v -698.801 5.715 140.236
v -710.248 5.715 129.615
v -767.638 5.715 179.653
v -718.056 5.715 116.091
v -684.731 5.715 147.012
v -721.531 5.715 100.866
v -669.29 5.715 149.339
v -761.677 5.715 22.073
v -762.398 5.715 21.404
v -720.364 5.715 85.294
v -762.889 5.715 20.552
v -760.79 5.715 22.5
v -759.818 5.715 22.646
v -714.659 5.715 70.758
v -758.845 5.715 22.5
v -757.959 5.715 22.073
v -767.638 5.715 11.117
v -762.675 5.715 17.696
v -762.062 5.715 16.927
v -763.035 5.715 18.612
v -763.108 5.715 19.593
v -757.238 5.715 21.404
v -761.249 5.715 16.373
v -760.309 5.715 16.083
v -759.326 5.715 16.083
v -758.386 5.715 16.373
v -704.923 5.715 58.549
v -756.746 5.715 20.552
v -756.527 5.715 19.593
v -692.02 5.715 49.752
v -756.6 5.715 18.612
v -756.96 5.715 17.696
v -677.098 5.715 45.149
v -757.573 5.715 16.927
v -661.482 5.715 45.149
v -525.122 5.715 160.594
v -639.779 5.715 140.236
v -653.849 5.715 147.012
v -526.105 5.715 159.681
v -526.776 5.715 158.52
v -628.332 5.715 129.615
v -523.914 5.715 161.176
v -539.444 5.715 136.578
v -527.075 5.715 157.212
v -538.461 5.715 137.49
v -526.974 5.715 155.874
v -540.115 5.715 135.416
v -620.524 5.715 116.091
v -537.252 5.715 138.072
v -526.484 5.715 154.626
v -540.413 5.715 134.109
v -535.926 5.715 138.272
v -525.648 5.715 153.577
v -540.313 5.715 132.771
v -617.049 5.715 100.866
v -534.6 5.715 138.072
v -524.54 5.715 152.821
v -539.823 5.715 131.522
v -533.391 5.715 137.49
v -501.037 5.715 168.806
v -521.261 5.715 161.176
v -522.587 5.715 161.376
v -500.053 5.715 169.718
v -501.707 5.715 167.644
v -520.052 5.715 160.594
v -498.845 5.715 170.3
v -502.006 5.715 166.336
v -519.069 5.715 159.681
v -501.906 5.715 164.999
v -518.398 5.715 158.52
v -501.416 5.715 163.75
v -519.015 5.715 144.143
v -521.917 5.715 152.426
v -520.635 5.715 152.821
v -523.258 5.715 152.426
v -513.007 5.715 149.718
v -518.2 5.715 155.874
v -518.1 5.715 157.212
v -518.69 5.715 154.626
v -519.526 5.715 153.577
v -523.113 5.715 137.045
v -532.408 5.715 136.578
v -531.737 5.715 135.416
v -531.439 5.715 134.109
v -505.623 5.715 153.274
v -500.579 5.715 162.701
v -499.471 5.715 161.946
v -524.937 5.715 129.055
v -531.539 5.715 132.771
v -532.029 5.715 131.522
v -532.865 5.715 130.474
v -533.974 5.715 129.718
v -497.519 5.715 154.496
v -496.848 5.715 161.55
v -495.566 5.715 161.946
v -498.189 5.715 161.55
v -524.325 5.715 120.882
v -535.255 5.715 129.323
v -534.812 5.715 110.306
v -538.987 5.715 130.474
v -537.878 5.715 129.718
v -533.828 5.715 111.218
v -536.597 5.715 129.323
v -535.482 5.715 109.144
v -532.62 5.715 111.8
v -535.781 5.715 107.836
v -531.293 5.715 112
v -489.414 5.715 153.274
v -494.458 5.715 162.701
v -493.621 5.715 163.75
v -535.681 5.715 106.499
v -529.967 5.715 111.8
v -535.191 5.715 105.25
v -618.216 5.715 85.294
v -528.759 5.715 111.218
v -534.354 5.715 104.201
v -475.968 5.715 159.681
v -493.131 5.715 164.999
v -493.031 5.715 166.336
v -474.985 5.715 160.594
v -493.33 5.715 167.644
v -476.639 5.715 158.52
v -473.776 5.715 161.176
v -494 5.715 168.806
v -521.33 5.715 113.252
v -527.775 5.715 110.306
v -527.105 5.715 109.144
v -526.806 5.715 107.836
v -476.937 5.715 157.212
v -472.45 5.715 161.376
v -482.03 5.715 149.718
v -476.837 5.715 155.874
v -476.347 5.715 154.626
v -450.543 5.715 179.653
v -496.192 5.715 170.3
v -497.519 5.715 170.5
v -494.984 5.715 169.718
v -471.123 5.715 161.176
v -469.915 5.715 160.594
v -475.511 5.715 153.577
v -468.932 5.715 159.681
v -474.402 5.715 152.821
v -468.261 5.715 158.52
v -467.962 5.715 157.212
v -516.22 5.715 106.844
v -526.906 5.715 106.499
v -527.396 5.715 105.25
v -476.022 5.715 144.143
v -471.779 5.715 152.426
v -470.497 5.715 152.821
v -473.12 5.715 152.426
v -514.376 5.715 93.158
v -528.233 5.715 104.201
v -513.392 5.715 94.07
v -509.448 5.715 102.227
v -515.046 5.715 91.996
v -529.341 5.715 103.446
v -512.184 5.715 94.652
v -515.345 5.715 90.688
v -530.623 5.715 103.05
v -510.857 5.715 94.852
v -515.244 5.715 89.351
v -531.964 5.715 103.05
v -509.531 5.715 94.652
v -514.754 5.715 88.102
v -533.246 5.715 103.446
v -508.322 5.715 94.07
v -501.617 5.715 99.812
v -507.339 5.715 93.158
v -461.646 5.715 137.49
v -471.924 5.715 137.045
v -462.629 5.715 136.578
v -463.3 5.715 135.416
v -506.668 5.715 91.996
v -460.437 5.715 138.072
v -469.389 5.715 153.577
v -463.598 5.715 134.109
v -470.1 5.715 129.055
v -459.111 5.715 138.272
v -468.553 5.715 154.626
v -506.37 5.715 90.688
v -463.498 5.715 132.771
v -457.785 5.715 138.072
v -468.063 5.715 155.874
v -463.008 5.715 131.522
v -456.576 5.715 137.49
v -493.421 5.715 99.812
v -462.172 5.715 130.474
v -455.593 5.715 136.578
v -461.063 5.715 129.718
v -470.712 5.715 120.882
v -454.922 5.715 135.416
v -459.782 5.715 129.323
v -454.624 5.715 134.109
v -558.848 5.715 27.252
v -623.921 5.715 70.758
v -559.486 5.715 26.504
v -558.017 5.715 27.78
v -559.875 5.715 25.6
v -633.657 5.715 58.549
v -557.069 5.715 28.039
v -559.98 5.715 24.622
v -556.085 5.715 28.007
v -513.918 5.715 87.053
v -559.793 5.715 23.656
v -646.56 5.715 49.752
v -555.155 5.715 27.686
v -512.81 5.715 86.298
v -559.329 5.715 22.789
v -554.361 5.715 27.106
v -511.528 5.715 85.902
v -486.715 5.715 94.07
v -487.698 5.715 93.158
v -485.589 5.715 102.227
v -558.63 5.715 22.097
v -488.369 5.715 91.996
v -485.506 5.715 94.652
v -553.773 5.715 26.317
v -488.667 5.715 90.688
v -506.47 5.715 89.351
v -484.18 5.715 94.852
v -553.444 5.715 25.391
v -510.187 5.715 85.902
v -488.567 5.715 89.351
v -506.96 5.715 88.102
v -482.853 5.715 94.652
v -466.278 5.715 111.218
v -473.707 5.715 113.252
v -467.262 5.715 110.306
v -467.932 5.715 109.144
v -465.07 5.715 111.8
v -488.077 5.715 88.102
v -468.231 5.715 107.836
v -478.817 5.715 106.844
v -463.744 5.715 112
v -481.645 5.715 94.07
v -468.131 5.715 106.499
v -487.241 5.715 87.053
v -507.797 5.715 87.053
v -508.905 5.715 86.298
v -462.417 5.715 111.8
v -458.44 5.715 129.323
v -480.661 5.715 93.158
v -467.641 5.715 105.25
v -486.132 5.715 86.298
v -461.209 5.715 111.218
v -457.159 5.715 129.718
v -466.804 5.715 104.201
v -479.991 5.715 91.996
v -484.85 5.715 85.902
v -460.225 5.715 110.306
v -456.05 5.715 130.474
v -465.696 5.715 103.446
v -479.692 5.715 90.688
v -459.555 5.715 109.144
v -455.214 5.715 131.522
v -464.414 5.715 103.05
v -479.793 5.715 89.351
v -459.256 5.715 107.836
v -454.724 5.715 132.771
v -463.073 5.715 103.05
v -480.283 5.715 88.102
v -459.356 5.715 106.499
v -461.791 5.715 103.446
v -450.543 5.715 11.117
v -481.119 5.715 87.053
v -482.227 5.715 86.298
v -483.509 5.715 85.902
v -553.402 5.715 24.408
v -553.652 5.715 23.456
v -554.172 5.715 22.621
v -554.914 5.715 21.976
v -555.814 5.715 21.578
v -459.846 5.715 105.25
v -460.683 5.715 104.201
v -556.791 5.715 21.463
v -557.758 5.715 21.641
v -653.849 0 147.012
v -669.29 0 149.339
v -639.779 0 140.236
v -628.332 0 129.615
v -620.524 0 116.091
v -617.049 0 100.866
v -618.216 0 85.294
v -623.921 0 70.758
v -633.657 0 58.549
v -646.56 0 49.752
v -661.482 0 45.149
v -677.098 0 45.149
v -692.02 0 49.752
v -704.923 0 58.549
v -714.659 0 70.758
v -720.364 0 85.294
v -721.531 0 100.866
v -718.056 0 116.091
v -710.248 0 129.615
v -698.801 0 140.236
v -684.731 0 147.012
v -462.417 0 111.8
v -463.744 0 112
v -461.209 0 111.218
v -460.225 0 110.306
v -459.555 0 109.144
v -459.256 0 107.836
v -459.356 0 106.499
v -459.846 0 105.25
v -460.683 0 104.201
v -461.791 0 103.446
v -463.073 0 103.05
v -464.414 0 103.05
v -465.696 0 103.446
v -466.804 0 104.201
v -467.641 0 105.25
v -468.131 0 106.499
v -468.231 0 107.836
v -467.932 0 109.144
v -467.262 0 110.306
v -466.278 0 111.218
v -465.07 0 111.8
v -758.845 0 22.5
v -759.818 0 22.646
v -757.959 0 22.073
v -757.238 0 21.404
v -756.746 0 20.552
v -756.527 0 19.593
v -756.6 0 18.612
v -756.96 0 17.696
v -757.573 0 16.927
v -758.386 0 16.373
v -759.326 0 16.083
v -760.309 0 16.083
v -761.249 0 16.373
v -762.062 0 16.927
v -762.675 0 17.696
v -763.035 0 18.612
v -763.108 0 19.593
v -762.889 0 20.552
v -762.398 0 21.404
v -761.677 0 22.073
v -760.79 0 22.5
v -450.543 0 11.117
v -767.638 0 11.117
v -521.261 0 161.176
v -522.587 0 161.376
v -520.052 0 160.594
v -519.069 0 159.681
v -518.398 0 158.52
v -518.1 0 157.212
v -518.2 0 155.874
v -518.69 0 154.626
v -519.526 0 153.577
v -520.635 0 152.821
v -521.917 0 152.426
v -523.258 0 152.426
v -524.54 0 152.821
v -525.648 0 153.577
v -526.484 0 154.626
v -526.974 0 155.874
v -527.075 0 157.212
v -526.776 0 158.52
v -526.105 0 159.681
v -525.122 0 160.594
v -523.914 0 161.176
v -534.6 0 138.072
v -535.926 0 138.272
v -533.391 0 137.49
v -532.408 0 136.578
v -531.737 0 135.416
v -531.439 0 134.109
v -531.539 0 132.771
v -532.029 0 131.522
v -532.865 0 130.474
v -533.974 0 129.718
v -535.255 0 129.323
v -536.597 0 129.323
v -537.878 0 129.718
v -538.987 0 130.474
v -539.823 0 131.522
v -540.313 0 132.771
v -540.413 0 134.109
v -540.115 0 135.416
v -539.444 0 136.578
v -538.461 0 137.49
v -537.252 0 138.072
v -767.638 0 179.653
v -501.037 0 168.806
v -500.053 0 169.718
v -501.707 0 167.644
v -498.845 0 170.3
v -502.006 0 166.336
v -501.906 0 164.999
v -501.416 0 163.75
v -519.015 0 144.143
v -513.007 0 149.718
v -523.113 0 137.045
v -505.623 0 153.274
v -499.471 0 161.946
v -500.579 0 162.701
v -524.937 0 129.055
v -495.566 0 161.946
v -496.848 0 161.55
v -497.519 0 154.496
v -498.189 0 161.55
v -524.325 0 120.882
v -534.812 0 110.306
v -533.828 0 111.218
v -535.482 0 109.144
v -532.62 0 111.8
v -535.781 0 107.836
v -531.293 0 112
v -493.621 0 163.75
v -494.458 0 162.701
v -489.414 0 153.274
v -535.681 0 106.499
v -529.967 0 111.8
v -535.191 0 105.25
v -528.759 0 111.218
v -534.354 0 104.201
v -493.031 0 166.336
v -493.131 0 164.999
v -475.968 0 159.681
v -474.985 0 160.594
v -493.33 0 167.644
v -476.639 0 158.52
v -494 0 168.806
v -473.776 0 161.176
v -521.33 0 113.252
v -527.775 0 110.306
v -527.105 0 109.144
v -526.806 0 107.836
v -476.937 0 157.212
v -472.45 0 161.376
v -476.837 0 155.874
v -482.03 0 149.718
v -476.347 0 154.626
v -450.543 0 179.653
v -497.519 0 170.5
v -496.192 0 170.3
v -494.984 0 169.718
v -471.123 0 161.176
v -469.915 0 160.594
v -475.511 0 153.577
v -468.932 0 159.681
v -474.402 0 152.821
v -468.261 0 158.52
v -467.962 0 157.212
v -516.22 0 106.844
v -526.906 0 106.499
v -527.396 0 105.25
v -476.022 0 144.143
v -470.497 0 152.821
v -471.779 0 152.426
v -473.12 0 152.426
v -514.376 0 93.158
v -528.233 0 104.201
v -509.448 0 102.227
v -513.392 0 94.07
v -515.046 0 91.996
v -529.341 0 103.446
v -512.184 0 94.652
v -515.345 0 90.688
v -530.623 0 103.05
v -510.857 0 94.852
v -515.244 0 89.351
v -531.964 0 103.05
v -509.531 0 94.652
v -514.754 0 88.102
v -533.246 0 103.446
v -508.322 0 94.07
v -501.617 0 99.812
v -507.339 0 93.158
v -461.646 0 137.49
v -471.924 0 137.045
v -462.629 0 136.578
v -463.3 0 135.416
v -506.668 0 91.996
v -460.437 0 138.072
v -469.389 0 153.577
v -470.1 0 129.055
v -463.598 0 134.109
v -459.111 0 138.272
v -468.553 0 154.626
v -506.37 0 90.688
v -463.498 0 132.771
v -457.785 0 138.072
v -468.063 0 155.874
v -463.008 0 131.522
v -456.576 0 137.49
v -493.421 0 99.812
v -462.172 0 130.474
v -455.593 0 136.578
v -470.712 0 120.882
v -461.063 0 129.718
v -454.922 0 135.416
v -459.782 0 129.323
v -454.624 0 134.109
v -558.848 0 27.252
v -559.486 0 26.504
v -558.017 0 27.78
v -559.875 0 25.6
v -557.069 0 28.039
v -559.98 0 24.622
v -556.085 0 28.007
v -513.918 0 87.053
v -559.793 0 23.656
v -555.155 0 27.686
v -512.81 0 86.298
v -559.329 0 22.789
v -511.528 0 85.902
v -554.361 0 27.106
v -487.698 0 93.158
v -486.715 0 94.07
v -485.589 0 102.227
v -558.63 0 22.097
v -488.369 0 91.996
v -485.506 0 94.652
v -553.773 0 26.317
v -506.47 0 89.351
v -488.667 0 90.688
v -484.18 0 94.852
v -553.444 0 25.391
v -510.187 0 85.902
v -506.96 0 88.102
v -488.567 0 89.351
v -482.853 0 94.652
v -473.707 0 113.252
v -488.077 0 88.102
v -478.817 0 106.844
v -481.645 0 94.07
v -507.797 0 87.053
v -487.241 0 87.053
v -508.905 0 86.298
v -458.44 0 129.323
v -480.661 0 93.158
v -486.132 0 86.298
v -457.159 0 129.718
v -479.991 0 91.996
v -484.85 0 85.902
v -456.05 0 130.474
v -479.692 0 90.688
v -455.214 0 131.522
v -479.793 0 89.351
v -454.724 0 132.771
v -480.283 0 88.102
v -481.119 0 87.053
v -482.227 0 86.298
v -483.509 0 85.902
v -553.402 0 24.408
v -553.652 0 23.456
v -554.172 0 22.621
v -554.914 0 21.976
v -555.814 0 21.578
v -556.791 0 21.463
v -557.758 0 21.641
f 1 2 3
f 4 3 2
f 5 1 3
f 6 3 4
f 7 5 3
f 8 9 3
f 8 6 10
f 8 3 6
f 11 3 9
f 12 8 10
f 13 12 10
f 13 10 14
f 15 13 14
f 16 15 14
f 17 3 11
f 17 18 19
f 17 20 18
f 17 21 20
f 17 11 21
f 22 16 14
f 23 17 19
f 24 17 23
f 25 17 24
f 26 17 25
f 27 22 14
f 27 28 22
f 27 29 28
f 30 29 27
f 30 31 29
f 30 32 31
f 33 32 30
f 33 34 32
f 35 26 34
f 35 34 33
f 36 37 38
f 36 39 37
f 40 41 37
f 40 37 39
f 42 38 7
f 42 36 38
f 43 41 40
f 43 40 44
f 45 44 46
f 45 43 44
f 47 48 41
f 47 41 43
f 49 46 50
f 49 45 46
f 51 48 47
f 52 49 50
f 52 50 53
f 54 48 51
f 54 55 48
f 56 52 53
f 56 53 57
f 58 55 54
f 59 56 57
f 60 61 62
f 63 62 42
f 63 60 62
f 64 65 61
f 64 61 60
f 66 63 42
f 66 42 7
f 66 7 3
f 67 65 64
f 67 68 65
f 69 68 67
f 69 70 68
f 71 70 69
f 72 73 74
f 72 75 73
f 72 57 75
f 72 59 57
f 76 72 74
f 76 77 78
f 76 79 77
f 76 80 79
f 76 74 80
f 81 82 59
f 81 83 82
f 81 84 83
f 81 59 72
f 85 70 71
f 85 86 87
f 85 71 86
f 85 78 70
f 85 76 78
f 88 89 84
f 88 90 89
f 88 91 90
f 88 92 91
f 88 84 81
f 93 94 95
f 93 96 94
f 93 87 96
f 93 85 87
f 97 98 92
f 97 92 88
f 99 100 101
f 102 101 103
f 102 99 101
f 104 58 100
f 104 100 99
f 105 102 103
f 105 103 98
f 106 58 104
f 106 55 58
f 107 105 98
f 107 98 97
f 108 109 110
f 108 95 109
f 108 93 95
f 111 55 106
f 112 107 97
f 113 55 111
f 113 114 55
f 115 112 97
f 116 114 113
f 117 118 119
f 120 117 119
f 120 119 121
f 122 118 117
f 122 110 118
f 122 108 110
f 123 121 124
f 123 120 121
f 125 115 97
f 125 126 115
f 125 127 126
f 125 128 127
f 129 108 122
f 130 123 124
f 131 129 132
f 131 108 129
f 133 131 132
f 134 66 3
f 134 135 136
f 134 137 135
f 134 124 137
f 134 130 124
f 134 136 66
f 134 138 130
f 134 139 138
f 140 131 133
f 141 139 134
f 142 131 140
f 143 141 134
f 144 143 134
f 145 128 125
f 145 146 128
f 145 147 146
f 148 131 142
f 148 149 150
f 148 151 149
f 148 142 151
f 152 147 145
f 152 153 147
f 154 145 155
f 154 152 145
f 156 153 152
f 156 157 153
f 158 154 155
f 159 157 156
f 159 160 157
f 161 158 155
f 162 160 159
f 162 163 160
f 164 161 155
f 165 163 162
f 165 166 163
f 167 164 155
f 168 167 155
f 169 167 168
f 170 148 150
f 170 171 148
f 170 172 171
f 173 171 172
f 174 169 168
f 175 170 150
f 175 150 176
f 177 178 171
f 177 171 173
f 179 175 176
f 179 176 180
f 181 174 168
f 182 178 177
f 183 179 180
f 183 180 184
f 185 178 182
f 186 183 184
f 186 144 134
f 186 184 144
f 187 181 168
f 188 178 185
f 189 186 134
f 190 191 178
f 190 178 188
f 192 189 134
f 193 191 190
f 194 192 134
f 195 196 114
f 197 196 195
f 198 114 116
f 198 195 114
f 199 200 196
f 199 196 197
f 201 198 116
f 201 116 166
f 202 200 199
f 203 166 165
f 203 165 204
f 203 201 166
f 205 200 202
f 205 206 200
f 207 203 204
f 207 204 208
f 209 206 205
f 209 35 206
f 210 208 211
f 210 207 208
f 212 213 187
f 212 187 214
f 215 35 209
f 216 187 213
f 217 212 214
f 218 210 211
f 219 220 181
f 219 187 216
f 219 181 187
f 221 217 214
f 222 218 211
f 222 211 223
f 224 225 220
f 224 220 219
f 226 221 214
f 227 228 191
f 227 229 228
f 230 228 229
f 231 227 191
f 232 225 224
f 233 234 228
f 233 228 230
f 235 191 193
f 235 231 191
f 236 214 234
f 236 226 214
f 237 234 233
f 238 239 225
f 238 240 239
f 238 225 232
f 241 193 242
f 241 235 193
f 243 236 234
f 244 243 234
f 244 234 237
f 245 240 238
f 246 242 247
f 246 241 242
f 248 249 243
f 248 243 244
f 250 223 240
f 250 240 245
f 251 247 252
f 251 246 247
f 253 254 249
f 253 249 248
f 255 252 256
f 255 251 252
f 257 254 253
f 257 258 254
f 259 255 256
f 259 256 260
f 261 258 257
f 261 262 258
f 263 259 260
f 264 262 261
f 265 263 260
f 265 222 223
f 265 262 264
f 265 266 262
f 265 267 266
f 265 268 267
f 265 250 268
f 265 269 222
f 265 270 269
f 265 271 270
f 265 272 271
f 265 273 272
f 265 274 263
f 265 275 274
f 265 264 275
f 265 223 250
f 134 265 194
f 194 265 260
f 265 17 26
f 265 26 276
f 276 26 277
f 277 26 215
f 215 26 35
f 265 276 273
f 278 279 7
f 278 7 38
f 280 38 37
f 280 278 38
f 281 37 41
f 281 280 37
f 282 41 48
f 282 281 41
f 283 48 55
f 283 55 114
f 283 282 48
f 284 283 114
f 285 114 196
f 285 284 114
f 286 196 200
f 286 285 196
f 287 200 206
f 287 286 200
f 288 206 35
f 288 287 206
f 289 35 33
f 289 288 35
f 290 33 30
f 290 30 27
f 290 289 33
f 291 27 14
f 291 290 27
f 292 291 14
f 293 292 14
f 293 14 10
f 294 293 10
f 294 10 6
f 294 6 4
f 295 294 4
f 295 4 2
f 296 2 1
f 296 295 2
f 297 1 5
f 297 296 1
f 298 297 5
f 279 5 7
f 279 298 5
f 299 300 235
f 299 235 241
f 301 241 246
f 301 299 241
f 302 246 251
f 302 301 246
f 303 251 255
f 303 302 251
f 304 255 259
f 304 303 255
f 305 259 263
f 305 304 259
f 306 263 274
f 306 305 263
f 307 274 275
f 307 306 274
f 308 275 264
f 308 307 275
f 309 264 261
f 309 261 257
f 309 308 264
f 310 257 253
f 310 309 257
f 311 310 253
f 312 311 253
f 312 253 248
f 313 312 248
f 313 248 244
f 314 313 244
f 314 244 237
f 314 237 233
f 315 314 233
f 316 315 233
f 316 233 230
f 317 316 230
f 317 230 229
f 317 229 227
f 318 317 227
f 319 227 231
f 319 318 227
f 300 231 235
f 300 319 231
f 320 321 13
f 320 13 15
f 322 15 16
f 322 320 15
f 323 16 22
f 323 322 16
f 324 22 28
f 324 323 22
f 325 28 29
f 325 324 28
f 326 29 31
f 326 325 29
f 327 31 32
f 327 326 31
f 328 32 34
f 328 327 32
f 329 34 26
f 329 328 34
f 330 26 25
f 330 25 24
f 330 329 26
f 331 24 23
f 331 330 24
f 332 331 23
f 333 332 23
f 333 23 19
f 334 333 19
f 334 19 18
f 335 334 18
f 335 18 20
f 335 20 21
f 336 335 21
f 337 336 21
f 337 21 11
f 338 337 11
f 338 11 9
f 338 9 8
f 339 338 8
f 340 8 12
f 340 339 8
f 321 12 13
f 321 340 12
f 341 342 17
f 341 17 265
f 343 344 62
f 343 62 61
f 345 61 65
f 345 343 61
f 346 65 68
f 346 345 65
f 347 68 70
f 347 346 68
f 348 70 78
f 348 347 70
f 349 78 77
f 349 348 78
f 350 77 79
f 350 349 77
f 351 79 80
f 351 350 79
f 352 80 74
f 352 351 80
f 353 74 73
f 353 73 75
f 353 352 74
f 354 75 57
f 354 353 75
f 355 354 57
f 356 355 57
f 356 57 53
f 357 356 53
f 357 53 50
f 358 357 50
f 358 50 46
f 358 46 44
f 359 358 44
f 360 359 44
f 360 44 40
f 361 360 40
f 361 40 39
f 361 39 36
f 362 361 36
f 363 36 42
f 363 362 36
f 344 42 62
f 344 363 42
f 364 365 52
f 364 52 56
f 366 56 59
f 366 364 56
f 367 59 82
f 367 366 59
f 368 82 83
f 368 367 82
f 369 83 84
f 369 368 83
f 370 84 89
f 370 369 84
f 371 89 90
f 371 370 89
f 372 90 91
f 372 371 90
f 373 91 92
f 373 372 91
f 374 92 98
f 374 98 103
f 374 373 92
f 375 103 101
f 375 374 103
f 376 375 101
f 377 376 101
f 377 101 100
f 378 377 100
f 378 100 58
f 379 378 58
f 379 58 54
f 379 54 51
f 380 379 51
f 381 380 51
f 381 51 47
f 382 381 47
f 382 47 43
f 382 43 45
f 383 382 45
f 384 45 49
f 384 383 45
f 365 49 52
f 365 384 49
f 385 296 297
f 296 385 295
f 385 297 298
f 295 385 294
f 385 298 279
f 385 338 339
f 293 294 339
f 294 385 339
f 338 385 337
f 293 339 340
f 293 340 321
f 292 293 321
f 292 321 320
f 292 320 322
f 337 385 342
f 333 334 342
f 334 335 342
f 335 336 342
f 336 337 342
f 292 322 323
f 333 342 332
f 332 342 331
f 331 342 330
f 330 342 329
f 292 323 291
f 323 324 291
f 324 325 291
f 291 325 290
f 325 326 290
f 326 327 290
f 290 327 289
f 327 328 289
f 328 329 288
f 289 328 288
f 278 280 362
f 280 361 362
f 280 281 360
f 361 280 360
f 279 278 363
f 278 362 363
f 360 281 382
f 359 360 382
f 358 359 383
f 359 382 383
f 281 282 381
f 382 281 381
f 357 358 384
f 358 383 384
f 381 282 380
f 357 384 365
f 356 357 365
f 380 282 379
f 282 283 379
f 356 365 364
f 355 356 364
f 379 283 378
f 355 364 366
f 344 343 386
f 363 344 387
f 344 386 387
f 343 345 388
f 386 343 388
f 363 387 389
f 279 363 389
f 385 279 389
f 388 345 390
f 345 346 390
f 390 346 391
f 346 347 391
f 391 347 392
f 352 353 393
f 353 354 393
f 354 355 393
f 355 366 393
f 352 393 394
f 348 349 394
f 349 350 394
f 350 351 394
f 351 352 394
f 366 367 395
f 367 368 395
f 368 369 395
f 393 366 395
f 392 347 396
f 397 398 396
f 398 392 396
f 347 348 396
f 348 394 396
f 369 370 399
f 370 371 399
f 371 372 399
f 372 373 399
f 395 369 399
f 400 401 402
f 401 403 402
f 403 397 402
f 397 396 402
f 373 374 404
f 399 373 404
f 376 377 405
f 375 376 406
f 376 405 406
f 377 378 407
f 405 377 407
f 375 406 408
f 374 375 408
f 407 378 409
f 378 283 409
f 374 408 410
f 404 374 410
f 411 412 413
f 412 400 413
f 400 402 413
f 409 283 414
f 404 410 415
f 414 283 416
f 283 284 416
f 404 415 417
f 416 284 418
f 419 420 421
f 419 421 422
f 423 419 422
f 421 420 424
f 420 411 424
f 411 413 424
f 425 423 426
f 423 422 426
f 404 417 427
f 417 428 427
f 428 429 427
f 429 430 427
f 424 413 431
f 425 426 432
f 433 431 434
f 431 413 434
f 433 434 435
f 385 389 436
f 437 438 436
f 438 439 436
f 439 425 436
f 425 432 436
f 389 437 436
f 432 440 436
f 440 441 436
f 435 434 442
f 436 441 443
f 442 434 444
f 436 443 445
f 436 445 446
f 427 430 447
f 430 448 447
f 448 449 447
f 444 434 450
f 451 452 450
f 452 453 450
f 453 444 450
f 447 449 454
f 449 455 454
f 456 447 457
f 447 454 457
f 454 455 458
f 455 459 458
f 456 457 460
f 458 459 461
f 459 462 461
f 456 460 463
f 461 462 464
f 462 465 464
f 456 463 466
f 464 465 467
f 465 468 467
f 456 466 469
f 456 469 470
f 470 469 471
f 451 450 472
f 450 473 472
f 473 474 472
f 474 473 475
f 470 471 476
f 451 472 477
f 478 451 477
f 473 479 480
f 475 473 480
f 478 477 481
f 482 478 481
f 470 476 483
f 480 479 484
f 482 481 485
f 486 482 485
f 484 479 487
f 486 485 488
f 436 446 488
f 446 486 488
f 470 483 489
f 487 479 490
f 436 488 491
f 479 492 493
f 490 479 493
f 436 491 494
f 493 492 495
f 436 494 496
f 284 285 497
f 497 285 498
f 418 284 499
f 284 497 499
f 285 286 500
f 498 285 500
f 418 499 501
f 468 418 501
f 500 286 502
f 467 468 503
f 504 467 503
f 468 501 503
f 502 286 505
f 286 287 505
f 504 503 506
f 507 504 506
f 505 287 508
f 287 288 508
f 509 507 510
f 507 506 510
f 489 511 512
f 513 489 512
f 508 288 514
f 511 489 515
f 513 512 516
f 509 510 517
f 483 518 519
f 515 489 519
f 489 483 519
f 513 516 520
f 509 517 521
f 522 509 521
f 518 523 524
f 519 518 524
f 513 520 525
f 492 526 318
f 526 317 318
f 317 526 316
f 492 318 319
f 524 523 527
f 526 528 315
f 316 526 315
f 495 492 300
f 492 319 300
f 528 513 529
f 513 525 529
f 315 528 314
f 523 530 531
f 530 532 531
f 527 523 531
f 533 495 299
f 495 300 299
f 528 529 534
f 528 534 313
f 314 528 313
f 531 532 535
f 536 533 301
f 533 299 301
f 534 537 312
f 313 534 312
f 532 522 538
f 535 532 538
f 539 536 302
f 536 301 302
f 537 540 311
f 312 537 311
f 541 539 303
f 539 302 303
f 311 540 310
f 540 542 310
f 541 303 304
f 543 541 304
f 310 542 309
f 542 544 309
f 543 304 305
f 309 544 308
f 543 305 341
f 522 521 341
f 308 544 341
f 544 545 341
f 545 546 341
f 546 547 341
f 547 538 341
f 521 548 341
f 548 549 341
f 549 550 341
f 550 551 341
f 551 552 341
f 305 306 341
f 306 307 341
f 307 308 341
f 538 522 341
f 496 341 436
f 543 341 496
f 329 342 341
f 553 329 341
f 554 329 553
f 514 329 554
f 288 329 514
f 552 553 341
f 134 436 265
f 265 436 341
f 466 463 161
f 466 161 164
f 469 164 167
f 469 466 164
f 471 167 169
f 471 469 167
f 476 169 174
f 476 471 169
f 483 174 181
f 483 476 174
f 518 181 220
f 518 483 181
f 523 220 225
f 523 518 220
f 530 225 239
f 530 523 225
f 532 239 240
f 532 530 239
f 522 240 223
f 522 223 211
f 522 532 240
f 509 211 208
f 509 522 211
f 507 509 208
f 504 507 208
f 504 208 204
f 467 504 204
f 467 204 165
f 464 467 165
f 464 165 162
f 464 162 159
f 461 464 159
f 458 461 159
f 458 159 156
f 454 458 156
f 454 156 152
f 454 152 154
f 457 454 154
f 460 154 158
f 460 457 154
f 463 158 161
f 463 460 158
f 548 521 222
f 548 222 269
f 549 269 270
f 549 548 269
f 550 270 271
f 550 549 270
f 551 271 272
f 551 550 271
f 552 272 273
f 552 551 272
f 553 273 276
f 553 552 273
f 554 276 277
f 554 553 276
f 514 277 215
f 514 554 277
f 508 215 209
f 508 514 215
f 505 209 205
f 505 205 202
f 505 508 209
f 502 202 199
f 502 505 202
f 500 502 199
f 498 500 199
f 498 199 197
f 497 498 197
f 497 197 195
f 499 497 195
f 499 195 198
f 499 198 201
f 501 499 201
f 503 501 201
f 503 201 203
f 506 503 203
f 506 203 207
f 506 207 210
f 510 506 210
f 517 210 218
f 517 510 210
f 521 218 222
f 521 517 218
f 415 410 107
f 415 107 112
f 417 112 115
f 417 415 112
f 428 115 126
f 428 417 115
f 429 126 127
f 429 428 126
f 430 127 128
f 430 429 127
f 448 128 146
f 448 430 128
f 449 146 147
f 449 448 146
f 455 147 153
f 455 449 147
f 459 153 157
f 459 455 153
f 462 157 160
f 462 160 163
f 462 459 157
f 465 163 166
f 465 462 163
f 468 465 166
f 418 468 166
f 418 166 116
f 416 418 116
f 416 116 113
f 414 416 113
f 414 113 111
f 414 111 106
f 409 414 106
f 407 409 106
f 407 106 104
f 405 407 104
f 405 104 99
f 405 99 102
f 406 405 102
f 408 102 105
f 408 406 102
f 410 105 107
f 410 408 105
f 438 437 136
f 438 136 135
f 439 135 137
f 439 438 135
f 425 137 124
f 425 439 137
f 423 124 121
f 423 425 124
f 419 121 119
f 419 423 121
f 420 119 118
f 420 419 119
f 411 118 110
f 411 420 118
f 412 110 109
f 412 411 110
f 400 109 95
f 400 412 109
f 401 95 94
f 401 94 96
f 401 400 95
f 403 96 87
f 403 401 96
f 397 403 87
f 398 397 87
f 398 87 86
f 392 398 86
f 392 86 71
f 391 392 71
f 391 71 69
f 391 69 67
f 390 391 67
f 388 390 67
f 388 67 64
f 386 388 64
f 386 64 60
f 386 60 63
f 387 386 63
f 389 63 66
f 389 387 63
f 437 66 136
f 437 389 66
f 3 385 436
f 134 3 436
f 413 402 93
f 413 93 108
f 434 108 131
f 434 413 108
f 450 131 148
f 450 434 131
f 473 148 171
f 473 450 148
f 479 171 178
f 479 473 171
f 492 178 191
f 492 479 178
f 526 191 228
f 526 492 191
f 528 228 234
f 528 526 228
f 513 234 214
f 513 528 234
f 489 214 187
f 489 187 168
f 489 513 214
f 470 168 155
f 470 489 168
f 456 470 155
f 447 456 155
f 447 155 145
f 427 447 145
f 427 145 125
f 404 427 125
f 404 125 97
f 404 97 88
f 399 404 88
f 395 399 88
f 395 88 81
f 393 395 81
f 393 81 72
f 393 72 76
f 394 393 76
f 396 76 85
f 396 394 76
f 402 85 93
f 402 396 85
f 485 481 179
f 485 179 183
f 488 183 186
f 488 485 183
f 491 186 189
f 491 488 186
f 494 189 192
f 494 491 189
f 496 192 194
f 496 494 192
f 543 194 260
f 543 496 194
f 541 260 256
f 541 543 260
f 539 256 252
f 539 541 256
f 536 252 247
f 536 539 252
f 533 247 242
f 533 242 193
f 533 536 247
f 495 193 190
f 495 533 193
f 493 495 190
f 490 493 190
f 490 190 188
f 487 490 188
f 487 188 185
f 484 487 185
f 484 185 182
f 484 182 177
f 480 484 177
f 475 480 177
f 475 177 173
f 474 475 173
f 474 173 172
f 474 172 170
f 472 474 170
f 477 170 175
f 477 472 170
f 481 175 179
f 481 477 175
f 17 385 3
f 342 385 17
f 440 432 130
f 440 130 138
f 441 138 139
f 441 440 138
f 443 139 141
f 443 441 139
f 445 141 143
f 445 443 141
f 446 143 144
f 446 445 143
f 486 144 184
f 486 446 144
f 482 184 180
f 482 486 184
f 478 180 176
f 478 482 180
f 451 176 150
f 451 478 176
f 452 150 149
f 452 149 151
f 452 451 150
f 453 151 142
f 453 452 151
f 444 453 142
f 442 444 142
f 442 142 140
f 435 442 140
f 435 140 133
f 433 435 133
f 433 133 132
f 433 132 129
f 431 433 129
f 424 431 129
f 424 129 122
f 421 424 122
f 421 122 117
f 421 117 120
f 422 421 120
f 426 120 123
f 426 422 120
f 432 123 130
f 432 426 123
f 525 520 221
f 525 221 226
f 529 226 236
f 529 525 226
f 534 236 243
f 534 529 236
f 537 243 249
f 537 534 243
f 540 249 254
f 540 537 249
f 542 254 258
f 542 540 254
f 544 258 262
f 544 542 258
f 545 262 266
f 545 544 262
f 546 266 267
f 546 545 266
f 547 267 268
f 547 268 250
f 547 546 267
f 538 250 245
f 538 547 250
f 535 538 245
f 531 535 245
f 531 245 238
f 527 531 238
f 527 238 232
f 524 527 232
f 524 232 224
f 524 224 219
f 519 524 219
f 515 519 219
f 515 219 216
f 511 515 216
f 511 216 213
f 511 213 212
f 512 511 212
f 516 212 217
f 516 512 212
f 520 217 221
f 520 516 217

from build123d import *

# Parameters (mm, degrees)
SKETCH2_W           = 317.094917084
SKETCH2_H           = 168.536075584
SKETCH2_R           = 4.5
SKETCH2_R_2         = 27.4955
SKETCH2_R_3         = 52.3875
SKETCH2_R_4         = 3.3
BOSS_EXTRUDE1_DEPTH = 5.715


with BuildPart() as part:
    # Sketch2 → Boss-Extrude1 (new body)
    with BuildSketch(Plane(origin=(0, 0, 0), x_dir=(1, 0, 0), z_dir=(0, 1, 0))):
        with Locations((-609.090136829, -95.384753685)):
            Rectangle(SKETCH2_W, SKETCH2_H)
        with Locations(Location((-484.179723308, -90.351987789, 0), (0, 0, 270))):
            Circle(SKETCH2_R, mode=Mode.SUBTRACT)
        with Locations(Location((-510.857294488, -90.351987789, 0), (0, 0, 270))):
            Circle(SKETCH2_R, mode=Mode.SUBTRACT)
        with Locations(Location((-463.74351815, -107.5, 0), (0, 0, 270))):
            Circle(SKETCH2_R, mode=Mode.SUBTRACT)
        with Locations(Location((-531.293499646, -107.5, 0), (0, 0, 270))):
            Circle(SKETCH2_R, mode=Mode.SUBTRACT)
        with Locations(Location((-497.518508898, -127, 0), (0, 0, 270))):
            Circle(SKETCH2_R_2, mode=Mode.SUBTRACT)
        with Locations(Location((-459.111006531, -133.772278929, 0), (0, 0, 270))):
            Circle(SKETCH2_R, mode=Mode.SUBTRACT)
        with Locations(Location((-535.926011265, -133.772278929, 0), (0, 0, 270))):
            Circle(SKETCH2_R, mode=Mode.SUBTRACT)
        with Locations(Location((-472.44979212, -156.875733282, 0), (0, 0, 270))):
            Circle(SKETCH2_R, mode=Mode.SUBTRACT)
        with Locations(Location((-522.587225676, -156.875733282, 0), (0, 0, 270))):
            Circle(SKETCH2_R, mode=Mode.SUBTRACT)
        with Locations(Location((-497.518508898, -166, 0), (0, 0, 270))):
            Circle(SKETCH2_R, mode=Mode.SUBTRACT)
        with Locations(Location((-669.29, -96.951477372, 0), (0, 0, 270))):
            Circle(SKETCH2_R_3, mode=Mode.SUBTRACT)
        with Locations(Location((-759.817588698, -19.346338398, 0), (0, 0, 270))):
            Circle(SKETCH2_R_4, mode=Mode.SUBTRACT)
        with BuildLine():
            ThreePointArc((-559.922688418, -24.132284746), (-557.312350108, -28.000893528), (-553.443741326, -25.390555218))
            ThreePointArc((-553.443741326, -25.390555218), (-556.054079636, -21.521946436), (-559.922688418, -24.132284746))
        make_face(mode=Mode.SUBTRACT)
    extrude(amount=BOSS_EXTRUDE1_DEPTH)


solid = part.part
